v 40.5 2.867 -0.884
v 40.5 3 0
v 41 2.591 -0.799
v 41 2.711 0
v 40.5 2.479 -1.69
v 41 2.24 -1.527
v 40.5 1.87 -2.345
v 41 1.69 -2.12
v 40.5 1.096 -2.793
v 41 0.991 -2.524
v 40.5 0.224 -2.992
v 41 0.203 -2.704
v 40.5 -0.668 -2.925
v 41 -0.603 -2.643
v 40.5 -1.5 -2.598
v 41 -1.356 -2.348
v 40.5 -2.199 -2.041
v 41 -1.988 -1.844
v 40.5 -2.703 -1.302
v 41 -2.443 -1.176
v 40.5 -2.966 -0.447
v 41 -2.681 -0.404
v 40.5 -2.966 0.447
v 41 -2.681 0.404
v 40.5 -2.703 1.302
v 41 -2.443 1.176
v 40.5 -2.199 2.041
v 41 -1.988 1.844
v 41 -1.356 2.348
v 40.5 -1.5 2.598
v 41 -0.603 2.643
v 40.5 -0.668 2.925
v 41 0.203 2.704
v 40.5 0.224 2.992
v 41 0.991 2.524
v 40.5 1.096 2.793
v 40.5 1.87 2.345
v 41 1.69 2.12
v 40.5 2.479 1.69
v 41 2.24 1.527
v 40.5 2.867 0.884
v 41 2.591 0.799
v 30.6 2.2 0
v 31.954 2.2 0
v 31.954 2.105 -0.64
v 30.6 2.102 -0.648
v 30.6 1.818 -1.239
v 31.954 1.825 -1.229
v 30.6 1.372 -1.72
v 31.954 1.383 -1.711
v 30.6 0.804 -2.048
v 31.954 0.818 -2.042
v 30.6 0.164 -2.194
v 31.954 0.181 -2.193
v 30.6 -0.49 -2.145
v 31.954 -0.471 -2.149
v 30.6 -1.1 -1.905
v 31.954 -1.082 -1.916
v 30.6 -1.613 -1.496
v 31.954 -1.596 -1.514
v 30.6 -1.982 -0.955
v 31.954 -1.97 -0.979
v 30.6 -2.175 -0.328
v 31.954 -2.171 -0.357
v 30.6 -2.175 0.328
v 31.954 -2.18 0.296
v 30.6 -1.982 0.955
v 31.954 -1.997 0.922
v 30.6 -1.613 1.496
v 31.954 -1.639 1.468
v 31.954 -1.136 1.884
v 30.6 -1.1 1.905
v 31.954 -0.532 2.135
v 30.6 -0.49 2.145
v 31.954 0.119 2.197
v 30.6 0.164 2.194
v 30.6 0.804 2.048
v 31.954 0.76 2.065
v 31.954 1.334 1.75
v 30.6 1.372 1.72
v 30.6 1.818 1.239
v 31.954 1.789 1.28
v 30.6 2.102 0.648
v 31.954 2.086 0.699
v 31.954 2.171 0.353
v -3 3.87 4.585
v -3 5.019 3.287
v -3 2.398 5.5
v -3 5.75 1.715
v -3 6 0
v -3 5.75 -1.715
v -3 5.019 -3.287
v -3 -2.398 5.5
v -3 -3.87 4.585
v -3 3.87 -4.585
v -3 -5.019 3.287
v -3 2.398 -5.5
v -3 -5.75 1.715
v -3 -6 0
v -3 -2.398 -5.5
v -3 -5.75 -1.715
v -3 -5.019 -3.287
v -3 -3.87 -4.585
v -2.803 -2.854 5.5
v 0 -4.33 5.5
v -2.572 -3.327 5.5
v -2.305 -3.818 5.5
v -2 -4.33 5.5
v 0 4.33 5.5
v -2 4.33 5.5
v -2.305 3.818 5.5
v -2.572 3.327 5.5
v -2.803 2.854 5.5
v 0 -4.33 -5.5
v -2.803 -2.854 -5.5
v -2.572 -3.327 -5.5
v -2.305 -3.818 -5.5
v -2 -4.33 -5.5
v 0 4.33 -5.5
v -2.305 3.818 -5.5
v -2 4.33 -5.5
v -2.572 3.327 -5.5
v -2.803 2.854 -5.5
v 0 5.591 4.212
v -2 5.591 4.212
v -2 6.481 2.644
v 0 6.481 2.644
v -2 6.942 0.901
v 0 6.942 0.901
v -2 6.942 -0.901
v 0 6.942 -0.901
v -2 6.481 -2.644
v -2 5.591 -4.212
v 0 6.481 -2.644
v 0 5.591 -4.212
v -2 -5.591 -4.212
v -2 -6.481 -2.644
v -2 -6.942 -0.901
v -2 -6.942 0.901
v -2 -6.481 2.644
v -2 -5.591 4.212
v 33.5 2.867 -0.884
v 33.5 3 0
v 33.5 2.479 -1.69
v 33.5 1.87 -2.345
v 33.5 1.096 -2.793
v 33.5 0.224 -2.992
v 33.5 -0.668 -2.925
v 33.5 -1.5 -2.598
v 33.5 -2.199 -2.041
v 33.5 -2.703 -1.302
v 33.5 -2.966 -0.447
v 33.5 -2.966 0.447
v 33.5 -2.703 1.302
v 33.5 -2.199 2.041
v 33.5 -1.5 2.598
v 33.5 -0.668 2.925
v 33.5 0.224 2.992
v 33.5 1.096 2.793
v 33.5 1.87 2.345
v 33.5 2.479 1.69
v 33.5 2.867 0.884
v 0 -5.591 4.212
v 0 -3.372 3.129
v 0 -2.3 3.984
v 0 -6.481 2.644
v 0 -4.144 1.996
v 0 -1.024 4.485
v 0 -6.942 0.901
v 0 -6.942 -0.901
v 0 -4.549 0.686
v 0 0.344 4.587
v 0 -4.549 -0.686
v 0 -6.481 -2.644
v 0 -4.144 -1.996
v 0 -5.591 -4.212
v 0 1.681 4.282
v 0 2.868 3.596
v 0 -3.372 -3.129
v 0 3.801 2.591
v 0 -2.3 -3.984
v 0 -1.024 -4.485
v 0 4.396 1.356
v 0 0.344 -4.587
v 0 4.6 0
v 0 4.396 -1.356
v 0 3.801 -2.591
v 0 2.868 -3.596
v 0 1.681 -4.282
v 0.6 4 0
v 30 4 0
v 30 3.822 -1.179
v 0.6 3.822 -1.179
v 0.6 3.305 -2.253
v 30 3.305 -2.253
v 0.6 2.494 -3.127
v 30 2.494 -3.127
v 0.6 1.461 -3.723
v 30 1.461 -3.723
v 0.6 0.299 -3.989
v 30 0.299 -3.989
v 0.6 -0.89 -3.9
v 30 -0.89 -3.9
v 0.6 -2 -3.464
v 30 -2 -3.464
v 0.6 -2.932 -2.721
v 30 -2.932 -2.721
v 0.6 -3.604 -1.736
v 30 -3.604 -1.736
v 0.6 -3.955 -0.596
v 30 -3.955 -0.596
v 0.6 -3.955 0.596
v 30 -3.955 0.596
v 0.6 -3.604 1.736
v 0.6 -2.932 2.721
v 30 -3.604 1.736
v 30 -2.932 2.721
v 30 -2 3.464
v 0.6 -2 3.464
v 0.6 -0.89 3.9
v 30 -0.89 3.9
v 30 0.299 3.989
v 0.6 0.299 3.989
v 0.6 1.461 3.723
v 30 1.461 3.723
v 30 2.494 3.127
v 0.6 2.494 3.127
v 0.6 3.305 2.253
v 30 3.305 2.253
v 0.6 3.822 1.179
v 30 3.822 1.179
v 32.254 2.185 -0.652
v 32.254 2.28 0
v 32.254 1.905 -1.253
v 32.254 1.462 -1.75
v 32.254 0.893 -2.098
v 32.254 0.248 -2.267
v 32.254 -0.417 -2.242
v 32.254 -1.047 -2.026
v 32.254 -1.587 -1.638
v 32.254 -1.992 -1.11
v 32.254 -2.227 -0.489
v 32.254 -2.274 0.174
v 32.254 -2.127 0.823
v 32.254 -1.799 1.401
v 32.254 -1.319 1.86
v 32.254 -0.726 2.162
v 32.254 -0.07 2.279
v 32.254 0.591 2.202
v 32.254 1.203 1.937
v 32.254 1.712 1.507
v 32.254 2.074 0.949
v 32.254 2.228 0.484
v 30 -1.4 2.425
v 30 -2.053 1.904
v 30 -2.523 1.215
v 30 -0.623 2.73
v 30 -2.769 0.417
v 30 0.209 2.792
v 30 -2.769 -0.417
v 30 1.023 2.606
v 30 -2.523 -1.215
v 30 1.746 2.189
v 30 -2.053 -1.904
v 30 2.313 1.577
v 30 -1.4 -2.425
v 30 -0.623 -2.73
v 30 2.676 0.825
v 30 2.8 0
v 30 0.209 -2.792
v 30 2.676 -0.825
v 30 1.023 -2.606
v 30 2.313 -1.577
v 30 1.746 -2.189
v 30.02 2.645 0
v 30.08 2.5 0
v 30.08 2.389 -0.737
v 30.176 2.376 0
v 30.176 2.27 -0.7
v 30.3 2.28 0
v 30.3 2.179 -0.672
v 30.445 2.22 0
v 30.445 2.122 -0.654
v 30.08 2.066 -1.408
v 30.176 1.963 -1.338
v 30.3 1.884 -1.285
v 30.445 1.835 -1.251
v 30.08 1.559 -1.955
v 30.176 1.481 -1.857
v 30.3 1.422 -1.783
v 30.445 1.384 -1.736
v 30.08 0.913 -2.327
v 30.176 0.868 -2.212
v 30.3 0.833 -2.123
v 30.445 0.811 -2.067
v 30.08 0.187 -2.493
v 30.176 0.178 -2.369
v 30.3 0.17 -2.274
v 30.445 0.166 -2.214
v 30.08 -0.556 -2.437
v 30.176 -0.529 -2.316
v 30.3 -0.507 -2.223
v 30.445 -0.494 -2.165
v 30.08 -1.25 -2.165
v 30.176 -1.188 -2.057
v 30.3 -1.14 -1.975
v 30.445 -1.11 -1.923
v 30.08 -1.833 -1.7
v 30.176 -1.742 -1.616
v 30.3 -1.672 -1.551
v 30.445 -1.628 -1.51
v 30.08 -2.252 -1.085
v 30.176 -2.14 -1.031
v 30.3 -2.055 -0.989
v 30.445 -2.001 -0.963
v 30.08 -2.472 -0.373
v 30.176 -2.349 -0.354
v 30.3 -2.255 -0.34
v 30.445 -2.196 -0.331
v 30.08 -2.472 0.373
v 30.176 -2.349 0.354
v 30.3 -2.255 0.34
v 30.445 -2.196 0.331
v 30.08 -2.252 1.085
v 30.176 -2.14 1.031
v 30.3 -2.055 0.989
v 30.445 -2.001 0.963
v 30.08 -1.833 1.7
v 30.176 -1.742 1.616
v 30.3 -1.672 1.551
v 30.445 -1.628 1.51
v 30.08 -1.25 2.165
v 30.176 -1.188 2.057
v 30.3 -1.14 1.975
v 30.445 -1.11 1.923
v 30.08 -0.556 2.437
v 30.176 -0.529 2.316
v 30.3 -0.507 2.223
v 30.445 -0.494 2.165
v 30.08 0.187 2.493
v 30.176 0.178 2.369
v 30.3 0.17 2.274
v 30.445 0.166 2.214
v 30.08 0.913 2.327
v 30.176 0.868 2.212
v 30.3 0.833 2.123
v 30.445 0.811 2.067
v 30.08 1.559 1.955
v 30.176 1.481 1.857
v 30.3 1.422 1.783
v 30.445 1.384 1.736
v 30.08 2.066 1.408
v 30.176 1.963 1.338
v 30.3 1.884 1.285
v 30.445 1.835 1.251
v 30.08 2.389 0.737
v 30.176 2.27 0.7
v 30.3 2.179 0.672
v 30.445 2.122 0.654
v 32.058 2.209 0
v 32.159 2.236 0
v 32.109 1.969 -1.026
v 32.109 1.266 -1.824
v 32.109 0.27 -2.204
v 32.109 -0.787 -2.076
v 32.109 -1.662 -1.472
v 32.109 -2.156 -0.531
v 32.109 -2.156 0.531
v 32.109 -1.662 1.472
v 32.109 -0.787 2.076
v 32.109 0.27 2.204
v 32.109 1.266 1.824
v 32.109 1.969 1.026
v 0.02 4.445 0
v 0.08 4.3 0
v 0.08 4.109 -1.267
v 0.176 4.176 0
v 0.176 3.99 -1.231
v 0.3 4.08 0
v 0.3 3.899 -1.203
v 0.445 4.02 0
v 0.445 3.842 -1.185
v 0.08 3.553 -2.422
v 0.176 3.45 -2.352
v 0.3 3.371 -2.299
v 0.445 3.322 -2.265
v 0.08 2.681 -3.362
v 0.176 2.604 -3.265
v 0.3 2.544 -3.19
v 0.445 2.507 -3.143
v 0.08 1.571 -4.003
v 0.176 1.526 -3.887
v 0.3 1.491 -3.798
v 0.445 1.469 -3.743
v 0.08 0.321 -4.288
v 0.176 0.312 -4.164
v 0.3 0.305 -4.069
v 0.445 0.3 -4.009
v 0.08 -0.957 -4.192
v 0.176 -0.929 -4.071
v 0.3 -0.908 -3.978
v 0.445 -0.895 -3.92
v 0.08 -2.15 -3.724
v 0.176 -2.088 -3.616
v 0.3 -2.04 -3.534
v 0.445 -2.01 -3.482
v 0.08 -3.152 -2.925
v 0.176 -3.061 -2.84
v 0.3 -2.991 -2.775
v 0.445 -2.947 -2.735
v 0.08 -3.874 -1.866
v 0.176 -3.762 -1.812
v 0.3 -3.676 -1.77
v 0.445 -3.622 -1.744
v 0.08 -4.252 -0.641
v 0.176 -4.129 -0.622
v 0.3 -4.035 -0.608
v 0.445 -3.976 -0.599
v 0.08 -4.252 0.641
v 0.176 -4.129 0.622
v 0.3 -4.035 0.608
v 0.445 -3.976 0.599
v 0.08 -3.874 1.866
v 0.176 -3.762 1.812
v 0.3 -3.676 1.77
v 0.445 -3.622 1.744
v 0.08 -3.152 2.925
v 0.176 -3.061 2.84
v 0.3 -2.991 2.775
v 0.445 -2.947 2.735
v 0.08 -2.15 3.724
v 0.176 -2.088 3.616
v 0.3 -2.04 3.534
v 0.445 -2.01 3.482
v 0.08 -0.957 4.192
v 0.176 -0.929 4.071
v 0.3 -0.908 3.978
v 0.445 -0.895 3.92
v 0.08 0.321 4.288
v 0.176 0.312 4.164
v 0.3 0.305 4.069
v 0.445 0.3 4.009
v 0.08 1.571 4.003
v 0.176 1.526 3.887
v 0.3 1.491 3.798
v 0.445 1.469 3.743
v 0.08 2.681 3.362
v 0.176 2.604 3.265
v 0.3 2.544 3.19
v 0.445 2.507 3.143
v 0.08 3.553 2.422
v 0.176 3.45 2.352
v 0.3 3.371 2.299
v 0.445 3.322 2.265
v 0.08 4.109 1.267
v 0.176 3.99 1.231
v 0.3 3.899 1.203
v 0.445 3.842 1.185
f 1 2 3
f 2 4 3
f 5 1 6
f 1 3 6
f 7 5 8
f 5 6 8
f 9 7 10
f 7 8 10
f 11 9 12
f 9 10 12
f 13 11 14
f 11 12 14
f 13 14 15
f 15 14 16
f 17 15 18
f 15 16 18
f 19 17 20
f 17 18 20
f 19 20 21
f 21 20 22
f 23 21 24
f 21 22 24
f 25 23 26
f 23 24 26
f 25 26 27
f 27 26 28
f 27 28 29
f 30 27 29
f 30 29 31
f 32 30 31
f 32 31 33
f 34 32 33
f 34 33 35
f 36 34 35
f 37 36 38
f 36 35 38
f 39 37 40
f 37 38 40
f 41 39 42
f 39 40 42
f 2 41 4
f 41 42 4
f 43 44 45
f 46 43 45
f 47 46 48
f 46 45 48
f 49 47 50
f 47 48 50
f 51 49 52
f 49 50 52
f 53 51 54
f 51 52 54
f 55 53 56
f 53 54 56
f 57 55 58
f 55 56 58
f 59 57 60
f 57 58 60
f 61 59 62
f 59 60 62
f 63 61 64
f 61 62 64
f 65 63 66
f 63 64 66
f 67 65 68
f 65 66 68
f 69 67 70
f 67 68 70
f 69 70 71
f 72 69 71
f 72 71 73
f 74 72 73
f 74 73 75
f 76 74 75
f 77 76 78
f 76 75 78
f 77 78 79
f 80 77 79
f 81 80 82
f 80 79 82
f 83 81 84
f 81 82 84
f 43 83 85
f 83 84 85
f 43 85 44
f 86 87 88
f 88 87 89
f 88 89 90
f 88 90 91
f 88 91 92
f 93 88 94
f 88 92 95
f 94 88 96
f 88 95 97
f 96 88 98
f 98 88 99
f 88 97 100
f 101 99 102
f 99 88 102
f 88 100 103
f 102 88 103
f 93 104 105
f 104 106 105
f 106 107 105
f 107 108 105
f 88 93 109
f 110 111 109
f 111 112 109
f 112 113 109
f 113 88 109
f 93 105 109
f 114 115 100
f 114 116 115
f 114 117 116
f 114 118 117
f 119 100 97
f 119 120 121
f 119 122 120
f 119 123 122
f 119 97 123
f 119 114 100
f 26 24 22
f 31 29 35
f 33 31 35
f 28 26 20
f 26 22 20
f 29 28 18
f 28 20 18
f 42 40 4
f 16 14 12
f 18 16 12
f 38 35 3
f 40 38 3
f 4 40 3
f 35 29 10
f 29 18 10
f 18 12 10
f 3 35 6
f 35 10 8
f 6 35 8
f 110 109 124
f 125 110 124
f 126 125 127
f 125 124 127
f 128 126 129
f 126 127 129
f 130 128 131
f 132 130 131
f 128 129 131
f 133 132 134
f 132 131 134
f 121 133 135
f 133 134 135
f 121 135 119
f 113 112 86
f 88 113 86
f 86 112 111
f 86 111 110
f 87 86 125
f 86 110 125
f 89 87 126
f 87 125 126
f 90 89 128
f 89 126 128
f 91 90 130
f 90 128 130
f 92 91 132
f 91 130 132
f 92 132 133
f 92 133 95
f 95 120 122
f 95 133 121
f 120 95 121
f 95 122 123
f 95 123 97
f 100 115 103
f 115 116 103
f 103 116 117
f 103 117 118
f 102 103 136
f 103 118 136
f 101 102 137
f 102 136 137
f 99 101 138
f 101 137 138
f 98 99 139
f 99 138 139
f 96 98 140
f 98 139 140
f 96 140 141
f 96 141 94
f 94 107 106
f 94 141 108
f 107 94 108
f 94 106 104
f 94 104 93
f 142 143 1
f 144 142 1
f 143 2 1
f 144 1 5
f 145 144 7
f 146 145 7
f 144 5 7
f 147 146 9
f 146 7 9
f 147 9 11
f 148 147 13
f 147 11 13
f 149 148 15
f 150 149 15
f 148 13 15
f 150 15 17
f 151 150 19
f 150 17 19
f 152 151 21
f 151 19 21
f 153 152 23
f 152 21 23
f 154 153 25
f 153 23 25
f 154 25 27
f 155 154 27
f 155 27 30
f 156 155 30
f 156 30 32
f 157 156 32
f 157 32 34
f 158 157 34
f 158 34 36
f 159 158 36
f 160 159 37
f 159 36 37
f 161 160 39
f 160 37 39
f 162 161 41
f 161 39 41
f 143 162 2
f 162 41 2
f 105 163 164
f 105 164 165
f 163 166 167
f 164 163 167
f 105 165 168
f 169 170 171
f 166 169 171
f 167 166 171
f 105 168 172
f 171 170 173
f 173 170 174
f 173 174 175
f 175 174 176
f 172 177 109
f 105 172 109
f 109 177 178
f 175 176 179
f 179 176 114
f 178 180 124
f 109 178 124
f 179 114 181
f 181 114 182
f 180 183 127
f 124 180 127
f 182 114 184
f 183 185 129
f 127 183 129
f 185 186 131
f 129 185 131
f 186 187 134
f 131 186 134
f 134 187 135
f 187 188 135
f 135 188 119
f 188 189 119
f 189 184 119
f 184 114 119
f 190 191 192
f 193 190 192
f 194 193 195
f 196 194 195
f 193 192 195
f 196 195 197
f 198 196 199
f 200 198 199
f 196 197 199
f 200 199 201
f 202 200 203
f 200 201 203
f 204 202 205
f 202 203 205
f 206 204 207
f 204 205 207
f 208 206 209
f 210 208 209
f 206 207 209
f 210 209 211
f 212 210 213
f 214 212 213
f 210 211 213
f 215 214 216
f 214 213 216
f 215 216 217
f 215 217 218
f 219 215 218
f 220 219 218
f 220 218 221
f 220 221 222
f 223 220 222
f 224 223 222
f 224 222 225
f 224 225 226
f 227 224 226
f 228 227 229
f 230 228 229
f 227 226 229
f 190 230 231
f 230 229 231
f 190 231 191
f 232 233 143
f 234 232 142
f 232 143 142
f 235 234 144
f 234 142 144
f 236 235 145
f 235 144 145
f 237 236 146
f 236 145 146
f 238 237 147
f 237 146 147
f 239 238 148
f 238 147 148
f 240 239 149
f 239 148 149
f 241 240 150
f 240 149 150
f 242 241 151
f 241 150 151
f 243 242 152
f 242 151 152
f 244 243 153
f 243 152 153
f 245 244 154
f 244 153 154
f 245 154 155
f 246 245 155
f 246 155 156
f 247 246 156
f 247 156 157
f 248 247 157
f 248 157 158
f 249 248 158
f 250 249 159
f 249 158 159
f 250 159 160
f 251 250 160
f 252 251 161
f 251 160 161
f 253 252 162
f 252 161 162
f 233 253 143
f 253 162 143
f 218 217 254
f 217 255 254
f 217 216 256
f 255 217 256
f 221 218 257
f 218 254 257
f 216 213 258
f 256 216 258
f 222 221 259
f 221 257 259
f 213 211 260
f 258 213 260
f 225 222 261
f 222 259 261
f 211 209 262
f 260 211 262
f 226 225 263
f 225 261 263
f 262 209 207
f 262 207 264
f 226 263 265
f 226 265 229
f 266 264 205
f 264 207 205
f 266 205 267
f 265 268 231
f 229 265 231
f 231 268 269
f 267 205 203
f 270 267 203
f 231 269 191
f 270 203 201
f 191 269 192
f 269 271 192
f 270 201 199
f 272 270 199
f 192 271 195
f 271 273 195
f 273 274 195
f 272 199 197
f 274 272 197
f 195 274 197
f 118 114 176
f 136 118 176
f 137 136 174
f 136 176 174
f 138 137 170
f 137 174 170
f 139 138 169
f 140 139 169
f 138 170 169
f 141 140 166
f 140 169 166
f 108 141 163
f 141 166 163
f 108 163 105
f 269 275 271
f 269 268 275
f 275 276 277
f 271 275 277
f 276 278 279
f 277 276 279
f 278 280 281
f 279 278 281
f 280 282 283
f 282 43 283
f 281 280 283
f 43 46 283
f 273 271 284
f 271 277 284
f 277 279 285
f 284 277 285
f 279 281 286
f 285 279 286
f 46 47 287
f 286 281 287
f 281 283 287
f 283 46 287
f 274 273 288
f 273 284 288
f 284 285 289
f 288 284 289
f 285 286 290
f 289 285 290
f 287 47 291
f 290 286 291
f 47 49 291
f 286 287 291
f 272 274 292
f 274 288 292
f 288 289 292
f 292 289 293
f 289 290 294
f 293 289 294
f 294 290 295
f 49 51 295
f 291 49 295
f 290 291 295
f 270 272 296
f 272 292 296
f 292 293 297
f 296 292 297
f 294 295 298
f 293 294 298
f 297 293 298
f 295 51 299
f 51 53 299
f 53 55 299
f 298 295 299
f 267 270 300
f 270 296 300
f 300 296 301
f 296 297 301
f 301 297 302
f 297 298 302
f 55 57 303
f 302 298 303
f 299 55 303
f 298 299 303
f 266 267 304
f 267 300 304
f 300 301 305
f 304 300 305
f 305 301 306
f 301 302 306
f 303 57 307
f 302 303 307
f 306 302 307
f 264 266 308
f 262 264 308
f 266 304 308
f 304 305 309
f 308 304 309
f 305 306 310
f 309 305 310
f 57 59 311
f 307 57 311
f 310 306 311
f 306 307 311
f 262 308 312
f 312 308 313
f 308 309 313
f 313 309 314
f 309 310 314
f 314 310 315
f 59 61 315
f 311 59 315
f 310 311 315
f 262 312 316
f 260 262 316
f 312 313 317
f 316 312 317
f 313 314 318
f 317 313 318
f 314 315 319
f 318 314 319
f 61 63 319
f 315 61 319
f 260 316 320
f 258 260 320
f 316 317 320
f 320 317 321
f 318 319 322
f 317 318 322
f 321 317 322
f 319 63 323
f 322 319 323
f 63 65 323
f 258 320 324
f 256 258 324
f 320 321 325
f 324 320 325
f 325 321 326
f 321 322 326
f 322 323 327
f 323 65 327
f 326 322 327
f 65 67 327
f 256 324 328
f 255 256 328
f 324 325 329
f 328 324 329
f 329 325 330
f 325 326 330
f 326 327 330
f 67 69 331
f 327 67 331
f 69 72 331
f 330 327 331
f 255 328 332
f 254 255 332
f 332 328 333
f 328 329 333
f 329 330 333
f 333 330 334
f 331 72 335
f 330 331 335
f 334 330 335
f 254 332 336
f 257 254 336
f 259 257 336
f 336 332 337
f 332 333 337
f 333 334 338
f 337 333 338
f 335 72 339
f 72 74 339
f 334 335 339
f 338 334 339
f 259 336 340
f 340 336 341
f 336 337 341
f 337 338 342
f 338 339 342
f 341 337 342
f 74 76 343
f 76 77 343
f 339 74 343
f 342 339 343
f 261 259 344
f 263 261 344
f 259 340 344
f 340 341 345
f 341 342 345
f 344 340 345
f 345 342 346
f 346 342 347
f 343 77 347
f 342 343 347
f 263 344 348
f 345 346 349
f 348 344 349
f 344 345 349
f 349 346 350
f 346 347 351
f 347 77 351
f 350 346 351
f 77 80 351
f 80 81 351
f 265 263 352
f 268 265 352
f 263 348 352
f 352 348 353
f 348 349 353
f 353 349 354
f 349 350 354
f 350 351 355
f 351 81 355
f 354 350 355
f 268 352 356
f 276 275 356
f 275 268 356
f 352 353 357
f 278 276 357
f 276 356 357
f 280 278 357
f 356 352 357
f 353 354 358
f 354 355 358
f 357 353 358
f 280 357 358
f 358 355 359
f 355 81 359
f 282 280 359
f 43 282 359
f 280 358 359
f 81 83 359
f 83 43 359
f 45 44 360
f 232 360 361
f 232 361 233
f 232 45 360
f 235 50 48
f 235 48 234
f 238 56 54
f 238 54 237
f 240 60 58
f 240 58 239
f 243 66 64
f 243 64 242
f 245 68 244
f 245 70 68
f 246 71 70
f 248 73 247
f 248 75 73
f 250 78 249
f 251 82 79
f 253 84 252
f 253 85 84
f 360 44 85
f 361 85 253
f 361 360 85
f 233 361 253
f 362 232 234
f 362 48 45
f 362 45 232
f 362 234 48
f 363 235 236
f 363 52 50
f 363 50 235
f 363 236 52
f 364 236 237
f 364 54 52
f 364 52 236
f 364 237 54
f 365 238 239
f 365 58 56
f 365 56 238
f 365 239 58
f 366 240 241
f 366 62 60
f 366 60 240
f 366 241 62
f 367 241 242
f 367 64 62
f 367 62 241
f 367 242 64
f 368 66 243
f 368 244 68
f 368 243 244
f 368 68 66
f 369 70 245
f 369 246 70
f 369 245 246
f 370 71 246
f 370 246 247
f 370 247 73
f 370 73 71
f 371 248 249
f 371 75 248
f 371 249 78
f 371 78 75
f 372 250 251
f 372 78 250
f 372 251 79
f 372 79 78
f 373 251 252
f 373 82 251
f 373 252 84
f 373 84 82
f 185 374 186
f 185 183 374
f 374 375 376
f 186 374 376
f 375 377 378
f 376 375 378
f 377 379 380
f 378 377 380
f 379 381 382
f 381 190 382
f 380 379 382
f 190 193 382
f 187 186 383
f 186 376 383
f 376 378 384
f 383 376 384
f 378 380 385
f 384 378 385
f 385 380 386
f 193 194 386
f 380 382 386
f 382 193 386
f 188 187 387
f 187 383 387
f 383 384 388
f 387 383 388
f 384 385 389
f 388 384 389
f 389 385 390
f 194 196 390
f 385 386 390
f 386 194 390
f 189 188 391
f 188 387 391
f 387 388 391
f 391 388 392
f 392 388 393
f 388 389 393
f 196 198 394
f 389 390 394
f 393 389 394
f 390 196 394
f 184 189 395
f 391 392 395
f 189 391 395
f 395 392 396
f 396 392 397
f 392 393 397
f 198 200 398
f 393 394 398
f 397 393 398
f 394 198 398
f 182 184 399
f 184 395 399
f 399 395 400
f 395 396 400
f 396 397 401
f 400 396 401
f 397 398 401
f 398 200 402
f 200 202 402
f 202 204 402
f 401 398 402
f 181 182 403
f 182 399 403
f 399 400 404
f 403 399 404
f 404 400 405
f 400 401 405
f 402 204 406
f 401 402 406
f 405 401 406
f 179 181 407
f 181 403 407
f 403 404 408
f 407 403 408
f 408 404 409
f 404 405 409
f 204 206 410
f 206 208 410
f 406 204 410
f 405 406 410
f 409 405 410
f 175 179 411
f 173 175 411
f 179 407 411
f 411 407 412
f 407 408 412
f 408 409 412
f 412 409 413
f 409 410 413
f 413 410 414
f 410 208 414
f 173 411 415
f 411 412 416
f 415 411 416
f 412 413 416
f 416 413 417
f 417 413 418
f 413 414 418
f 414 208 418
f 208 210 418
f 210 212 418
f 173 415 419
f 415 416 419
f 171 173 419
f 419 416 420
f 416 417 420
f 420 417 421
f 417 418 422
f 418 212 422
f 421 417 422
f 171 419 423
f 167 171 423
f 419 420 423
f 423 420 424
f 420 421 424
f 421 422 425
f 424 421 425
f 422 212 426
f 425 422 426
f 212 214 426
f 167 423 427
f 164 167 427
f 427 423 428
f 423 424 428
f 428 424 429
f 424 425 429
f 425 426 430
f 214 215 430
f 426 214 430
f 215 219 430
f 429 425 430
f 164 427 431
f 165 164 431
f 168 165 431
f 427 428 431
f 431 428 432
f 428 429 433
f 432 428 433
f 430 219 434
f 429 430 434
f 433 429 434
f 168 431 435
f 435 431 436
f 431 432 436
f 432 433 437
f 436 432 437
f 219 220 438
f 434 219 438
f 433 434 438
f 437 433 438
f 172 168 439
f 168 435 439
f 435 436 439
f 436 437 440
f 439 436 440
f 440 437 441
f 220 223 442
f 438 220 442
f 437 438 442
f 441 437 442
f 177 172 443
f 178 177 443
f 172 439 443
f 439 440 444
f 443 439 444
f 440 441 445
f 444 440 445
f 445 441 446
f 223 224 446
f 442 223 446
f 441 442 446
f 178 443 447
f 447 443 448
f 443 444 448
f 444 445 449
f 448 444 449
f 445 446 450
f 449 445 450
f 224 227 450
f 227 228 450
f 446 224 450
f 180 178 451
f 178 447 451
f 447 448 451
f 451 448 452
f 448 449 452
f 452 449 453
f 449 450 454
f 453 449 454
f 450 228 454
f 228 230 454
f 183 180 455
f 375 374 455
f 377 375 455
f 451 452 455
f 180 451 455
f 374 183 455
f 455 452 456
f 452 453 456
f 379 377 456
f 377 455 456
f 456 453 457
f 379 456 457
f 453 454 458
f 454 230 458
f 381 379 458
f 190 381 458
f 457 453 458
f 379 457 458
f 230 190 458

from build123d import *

# Parameters (mm, degrees)
SKIZZE3_W                       = 1.5
SKIZZE3_H                       = 14
SCHNITT_LINEAR_AUSTRAGEN2_DEPTH = 3
VERRUNDUNG1_R                   = 0.6
VERRUNDUNG3_R                   = 0.6


with BuildPart() as part:
    # Skizze1 → Rotation1 (revolve)
    with BuildSketch(Plane.XY):
        Polygon((-3, 0), (-3, 6), (-2, 7), (0, 7), (0, 4), (30, 4), (30, 2.2), (32.114359354, 2.2), (33.5, 3), (40.5, 3), (41, 2.711324865), (41, 0), align=None)
    revolve(axis=Axis((41, 0, 0), (-1, 0, 0)))

    # Skizze3 → Schnitt-Linear austragen2 (cut)
    with BuildSketch(Plane(origin=(0, 0, 0), x_dir=(0, 0, -1), z_dir=(1, 0, 0))):
        with Locations((-6.25, 0)):
            Rectangle(SKIZZE3_W, SKIZZE3_H)
        with Locations((6.25, 0)):
            Rectangle(SKIZZE3_W, SKIZZE3_H)
    extrude(amount=-SCHNITT_LINEAR_AUSTRAGEN2_DEPTH, mode=Mode.SUBTRACT)

    # Verrundung1
    verrundung1_edges = [part.edges().sort_by_distance(p)[0] for p in [
        (0, -4, 0),
    ]]
    fillet(verrundung1_edges, radius=VERRUNDUNG1_R)

    # Verrundung3
    verrundung3_edges = [part.edges().sort_by_distance(p)[0] for p in [
        (32.114359354, -2.2, 0),
        (30, -2.2, 0),
    ]]
    fillet(verrundung3_edges, radius=VERRUNDUNG3_R)


solid = part.part
